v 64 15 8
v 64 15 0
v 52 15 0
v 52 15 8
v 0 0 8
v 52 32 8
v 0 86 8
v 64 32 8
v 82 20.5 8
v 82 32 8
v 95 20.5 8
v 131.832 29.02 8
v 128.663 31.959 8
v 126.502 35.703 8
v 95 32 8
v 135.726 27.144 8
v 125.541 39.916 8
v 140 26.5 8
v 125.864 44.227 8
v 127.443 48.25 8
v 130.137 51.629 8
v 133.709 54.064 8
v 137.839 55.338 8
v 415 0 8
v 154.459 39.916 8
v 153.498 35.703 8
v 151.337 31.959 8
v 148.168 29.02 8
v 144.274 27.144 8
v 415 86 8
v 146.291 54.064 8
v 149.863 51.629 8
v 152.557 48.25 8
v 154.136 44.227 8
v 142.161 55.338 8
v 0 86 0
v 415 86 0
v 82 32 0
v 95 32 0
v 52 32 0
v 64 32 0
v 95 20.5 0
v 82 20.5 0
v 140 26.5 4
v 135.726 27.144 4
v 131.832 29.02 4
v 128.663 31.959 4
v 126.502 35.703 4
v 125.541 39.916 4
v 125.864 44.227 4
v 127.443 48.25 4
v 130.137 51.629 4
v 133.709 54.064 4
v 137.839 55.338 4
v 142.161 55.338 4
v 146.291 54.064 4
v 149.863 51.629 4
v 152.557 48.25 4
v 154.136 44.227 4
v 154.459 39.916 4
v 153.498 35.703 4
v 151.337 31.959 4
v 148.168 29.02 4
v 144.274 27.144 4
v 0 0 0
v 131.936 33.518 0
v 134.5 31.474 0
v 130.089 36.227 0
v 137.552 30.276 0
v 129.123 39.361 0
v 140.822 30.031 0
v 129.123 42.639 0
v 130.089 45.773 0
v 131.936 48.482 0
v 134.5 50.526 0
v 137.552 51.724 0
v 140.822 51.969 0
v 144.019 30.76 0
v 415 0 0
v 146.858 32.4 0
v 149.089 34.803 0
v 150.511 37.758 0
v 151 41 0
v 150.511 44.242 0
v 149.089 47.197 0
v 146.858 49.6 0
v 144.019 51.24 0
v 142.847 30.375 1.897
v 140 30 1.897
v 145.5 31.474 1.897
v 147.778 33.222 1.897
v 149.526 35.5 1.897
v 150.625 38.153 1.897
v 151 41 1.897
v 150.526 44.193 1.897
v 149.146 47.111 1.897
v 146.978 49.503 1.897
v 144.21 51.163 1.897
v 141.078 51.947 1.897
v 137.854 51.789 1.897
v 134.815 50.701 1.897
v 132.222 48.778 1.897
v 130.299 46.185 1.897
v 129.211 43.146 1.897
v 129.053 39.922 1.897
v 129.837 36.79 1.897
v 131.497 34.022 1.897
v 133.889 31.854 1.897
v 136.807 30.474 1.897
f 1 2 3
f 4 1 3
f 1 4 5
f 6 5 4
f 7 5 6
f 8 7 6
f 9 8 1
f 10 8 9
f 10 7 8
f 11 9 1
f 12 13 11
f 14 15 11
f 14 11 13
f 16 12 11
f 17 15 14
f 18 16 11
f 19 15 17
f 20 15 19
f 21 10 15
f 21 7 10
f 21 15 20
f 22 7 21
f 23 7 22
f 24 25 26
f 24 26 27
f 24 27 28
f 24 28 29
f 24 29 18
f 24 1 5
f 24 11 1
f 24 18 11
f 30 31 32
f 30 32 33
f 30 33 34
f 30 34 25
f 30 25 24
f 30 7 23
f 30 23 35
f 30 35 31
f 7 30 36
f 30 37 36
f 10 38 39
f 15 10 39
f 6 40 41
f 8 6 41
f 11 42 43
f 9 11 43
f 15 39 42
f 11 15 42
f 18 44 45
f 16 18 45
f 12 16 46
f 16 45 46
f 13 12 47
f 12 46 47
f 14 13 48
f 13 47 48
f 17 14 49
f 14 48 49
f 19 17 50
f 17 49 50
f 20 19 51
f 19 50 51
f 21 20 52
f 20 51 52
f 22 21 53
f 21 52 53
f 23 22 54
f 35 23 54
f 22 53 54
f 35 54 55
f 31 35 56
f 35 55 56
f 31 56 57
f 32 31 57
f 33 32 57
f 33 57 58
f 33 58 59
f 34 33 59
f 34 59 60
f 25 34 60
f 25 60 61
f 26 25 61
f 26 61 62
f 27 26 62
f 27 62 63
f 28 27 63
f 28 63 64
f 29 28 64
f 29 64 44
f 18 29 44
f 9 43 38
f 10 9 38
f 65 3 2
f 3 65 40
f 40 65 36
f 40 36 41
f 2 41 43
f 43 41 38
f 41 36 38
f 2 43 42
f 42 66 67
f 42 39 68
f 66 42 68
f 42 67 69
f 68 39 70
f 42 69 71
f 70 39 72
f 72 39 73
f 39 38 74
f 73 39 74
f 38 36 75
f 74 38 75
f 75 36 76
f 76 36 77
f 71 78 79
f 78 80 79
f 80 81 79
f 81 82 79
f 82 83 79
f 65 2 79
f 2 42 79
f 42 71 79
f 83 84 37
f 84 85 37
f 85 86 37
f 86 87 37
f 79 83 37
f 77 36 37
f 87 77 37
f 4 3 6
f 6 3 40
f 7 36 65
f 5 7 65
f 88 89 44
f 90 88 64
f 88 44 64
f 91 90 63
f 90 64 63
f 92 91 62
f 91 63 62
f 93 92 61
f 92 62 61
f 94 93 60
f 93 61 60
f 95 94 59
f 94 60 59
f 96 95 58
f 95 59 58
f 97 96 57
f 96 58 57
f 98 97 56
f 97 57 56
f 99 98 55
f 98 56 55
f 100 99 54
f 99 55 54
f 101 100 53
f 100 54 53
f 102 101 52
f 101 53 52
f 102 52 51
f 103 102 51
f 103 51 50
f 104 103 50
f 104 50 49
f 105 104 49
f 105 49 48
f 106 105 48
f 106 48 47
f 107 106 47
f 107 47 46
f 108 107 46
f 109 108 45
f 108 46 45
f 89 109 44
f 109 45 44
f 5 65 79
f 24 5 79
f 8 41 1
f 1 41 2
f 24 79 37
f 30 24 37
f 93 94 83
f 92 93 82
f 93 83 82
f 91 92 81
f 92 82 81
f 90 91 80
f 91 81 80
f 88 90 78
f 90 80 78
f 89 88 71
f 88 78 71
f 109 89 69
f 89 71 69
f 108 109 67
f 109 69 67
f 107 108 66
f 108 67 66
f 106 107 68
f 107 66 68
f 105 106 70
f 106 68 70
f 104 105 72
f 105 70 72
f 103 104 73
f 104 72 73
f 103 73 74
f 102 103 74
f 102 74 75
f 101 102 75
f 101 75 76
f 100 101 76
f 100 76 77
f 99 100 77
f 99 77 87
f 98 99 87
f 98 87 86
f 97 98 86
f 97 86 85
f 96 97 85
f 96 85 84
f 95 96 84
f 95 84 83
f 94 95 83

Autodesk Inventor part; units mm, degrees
ref_plane "YZ Plane" through (0, 0, 0) normal (1, 0, 0) x (0, 1, 0)
ref_plane "XZ Plane" through (0, 0, 0) normal (0, 1, 0) x (-1, 0, 0)
ref_plane "XY Plane" through (0, 0, 0) normal (0, 0, 1) x (1, 0, 0)
sketch "Sketch1" plane through (0, 0, 0) normal (0, 0, 1) x (1, 0, 0)
  line L0 (0, 0) -> (415, 0)
  line L1 (415, 0) -> (415, 86)
  line L2 (415, 86) -> (0, 86)
  line L3 (0, 86) -> (0, 0)
  line L4 (82, 32) -> (95, 32)
  line L5 (95, 32) -> (95, 20.5)
  line L6 (95, 20.5) -> (82, 20.5)
  line L7 (82, 20.5) -> (82, 32)
  line L8 (52, 32) -> (64, 32)
  line L9 (64, 32) -> (64, 15)
  line L10 (64, 15) -> (52, 15)
  line L11 (52, 15) -> (52, 32)
  circle A0 centre (140, 41) radius 11
  dimension "d0" = 415
  dimension "d1" = 86
  dimension "d2" = 82
  dimension "d3" = 54
  dimension "d4" = 13
  dimension "d5" = 11.5
  dimension "d8" = 18
  dimension "d9" = 12
  dimension "d10" = 17
  dimension "d11" = 54
  dimension "d12" = 22
  dimension "d13" = 45
  dimension "d14" = 45
ref_plane "Work Plane1" through (0, 0, 0) normal (0, 0, -1) x (-1, 0, 0)
extrude "Extrusion2" add sketch "Sketch1" along normal blind 8
hole "Hole1" at (140, 41, 8) direction (0, 0, -1) diameter 29 depth 4 tip angle 118
properties part number "placa laterala usb"
